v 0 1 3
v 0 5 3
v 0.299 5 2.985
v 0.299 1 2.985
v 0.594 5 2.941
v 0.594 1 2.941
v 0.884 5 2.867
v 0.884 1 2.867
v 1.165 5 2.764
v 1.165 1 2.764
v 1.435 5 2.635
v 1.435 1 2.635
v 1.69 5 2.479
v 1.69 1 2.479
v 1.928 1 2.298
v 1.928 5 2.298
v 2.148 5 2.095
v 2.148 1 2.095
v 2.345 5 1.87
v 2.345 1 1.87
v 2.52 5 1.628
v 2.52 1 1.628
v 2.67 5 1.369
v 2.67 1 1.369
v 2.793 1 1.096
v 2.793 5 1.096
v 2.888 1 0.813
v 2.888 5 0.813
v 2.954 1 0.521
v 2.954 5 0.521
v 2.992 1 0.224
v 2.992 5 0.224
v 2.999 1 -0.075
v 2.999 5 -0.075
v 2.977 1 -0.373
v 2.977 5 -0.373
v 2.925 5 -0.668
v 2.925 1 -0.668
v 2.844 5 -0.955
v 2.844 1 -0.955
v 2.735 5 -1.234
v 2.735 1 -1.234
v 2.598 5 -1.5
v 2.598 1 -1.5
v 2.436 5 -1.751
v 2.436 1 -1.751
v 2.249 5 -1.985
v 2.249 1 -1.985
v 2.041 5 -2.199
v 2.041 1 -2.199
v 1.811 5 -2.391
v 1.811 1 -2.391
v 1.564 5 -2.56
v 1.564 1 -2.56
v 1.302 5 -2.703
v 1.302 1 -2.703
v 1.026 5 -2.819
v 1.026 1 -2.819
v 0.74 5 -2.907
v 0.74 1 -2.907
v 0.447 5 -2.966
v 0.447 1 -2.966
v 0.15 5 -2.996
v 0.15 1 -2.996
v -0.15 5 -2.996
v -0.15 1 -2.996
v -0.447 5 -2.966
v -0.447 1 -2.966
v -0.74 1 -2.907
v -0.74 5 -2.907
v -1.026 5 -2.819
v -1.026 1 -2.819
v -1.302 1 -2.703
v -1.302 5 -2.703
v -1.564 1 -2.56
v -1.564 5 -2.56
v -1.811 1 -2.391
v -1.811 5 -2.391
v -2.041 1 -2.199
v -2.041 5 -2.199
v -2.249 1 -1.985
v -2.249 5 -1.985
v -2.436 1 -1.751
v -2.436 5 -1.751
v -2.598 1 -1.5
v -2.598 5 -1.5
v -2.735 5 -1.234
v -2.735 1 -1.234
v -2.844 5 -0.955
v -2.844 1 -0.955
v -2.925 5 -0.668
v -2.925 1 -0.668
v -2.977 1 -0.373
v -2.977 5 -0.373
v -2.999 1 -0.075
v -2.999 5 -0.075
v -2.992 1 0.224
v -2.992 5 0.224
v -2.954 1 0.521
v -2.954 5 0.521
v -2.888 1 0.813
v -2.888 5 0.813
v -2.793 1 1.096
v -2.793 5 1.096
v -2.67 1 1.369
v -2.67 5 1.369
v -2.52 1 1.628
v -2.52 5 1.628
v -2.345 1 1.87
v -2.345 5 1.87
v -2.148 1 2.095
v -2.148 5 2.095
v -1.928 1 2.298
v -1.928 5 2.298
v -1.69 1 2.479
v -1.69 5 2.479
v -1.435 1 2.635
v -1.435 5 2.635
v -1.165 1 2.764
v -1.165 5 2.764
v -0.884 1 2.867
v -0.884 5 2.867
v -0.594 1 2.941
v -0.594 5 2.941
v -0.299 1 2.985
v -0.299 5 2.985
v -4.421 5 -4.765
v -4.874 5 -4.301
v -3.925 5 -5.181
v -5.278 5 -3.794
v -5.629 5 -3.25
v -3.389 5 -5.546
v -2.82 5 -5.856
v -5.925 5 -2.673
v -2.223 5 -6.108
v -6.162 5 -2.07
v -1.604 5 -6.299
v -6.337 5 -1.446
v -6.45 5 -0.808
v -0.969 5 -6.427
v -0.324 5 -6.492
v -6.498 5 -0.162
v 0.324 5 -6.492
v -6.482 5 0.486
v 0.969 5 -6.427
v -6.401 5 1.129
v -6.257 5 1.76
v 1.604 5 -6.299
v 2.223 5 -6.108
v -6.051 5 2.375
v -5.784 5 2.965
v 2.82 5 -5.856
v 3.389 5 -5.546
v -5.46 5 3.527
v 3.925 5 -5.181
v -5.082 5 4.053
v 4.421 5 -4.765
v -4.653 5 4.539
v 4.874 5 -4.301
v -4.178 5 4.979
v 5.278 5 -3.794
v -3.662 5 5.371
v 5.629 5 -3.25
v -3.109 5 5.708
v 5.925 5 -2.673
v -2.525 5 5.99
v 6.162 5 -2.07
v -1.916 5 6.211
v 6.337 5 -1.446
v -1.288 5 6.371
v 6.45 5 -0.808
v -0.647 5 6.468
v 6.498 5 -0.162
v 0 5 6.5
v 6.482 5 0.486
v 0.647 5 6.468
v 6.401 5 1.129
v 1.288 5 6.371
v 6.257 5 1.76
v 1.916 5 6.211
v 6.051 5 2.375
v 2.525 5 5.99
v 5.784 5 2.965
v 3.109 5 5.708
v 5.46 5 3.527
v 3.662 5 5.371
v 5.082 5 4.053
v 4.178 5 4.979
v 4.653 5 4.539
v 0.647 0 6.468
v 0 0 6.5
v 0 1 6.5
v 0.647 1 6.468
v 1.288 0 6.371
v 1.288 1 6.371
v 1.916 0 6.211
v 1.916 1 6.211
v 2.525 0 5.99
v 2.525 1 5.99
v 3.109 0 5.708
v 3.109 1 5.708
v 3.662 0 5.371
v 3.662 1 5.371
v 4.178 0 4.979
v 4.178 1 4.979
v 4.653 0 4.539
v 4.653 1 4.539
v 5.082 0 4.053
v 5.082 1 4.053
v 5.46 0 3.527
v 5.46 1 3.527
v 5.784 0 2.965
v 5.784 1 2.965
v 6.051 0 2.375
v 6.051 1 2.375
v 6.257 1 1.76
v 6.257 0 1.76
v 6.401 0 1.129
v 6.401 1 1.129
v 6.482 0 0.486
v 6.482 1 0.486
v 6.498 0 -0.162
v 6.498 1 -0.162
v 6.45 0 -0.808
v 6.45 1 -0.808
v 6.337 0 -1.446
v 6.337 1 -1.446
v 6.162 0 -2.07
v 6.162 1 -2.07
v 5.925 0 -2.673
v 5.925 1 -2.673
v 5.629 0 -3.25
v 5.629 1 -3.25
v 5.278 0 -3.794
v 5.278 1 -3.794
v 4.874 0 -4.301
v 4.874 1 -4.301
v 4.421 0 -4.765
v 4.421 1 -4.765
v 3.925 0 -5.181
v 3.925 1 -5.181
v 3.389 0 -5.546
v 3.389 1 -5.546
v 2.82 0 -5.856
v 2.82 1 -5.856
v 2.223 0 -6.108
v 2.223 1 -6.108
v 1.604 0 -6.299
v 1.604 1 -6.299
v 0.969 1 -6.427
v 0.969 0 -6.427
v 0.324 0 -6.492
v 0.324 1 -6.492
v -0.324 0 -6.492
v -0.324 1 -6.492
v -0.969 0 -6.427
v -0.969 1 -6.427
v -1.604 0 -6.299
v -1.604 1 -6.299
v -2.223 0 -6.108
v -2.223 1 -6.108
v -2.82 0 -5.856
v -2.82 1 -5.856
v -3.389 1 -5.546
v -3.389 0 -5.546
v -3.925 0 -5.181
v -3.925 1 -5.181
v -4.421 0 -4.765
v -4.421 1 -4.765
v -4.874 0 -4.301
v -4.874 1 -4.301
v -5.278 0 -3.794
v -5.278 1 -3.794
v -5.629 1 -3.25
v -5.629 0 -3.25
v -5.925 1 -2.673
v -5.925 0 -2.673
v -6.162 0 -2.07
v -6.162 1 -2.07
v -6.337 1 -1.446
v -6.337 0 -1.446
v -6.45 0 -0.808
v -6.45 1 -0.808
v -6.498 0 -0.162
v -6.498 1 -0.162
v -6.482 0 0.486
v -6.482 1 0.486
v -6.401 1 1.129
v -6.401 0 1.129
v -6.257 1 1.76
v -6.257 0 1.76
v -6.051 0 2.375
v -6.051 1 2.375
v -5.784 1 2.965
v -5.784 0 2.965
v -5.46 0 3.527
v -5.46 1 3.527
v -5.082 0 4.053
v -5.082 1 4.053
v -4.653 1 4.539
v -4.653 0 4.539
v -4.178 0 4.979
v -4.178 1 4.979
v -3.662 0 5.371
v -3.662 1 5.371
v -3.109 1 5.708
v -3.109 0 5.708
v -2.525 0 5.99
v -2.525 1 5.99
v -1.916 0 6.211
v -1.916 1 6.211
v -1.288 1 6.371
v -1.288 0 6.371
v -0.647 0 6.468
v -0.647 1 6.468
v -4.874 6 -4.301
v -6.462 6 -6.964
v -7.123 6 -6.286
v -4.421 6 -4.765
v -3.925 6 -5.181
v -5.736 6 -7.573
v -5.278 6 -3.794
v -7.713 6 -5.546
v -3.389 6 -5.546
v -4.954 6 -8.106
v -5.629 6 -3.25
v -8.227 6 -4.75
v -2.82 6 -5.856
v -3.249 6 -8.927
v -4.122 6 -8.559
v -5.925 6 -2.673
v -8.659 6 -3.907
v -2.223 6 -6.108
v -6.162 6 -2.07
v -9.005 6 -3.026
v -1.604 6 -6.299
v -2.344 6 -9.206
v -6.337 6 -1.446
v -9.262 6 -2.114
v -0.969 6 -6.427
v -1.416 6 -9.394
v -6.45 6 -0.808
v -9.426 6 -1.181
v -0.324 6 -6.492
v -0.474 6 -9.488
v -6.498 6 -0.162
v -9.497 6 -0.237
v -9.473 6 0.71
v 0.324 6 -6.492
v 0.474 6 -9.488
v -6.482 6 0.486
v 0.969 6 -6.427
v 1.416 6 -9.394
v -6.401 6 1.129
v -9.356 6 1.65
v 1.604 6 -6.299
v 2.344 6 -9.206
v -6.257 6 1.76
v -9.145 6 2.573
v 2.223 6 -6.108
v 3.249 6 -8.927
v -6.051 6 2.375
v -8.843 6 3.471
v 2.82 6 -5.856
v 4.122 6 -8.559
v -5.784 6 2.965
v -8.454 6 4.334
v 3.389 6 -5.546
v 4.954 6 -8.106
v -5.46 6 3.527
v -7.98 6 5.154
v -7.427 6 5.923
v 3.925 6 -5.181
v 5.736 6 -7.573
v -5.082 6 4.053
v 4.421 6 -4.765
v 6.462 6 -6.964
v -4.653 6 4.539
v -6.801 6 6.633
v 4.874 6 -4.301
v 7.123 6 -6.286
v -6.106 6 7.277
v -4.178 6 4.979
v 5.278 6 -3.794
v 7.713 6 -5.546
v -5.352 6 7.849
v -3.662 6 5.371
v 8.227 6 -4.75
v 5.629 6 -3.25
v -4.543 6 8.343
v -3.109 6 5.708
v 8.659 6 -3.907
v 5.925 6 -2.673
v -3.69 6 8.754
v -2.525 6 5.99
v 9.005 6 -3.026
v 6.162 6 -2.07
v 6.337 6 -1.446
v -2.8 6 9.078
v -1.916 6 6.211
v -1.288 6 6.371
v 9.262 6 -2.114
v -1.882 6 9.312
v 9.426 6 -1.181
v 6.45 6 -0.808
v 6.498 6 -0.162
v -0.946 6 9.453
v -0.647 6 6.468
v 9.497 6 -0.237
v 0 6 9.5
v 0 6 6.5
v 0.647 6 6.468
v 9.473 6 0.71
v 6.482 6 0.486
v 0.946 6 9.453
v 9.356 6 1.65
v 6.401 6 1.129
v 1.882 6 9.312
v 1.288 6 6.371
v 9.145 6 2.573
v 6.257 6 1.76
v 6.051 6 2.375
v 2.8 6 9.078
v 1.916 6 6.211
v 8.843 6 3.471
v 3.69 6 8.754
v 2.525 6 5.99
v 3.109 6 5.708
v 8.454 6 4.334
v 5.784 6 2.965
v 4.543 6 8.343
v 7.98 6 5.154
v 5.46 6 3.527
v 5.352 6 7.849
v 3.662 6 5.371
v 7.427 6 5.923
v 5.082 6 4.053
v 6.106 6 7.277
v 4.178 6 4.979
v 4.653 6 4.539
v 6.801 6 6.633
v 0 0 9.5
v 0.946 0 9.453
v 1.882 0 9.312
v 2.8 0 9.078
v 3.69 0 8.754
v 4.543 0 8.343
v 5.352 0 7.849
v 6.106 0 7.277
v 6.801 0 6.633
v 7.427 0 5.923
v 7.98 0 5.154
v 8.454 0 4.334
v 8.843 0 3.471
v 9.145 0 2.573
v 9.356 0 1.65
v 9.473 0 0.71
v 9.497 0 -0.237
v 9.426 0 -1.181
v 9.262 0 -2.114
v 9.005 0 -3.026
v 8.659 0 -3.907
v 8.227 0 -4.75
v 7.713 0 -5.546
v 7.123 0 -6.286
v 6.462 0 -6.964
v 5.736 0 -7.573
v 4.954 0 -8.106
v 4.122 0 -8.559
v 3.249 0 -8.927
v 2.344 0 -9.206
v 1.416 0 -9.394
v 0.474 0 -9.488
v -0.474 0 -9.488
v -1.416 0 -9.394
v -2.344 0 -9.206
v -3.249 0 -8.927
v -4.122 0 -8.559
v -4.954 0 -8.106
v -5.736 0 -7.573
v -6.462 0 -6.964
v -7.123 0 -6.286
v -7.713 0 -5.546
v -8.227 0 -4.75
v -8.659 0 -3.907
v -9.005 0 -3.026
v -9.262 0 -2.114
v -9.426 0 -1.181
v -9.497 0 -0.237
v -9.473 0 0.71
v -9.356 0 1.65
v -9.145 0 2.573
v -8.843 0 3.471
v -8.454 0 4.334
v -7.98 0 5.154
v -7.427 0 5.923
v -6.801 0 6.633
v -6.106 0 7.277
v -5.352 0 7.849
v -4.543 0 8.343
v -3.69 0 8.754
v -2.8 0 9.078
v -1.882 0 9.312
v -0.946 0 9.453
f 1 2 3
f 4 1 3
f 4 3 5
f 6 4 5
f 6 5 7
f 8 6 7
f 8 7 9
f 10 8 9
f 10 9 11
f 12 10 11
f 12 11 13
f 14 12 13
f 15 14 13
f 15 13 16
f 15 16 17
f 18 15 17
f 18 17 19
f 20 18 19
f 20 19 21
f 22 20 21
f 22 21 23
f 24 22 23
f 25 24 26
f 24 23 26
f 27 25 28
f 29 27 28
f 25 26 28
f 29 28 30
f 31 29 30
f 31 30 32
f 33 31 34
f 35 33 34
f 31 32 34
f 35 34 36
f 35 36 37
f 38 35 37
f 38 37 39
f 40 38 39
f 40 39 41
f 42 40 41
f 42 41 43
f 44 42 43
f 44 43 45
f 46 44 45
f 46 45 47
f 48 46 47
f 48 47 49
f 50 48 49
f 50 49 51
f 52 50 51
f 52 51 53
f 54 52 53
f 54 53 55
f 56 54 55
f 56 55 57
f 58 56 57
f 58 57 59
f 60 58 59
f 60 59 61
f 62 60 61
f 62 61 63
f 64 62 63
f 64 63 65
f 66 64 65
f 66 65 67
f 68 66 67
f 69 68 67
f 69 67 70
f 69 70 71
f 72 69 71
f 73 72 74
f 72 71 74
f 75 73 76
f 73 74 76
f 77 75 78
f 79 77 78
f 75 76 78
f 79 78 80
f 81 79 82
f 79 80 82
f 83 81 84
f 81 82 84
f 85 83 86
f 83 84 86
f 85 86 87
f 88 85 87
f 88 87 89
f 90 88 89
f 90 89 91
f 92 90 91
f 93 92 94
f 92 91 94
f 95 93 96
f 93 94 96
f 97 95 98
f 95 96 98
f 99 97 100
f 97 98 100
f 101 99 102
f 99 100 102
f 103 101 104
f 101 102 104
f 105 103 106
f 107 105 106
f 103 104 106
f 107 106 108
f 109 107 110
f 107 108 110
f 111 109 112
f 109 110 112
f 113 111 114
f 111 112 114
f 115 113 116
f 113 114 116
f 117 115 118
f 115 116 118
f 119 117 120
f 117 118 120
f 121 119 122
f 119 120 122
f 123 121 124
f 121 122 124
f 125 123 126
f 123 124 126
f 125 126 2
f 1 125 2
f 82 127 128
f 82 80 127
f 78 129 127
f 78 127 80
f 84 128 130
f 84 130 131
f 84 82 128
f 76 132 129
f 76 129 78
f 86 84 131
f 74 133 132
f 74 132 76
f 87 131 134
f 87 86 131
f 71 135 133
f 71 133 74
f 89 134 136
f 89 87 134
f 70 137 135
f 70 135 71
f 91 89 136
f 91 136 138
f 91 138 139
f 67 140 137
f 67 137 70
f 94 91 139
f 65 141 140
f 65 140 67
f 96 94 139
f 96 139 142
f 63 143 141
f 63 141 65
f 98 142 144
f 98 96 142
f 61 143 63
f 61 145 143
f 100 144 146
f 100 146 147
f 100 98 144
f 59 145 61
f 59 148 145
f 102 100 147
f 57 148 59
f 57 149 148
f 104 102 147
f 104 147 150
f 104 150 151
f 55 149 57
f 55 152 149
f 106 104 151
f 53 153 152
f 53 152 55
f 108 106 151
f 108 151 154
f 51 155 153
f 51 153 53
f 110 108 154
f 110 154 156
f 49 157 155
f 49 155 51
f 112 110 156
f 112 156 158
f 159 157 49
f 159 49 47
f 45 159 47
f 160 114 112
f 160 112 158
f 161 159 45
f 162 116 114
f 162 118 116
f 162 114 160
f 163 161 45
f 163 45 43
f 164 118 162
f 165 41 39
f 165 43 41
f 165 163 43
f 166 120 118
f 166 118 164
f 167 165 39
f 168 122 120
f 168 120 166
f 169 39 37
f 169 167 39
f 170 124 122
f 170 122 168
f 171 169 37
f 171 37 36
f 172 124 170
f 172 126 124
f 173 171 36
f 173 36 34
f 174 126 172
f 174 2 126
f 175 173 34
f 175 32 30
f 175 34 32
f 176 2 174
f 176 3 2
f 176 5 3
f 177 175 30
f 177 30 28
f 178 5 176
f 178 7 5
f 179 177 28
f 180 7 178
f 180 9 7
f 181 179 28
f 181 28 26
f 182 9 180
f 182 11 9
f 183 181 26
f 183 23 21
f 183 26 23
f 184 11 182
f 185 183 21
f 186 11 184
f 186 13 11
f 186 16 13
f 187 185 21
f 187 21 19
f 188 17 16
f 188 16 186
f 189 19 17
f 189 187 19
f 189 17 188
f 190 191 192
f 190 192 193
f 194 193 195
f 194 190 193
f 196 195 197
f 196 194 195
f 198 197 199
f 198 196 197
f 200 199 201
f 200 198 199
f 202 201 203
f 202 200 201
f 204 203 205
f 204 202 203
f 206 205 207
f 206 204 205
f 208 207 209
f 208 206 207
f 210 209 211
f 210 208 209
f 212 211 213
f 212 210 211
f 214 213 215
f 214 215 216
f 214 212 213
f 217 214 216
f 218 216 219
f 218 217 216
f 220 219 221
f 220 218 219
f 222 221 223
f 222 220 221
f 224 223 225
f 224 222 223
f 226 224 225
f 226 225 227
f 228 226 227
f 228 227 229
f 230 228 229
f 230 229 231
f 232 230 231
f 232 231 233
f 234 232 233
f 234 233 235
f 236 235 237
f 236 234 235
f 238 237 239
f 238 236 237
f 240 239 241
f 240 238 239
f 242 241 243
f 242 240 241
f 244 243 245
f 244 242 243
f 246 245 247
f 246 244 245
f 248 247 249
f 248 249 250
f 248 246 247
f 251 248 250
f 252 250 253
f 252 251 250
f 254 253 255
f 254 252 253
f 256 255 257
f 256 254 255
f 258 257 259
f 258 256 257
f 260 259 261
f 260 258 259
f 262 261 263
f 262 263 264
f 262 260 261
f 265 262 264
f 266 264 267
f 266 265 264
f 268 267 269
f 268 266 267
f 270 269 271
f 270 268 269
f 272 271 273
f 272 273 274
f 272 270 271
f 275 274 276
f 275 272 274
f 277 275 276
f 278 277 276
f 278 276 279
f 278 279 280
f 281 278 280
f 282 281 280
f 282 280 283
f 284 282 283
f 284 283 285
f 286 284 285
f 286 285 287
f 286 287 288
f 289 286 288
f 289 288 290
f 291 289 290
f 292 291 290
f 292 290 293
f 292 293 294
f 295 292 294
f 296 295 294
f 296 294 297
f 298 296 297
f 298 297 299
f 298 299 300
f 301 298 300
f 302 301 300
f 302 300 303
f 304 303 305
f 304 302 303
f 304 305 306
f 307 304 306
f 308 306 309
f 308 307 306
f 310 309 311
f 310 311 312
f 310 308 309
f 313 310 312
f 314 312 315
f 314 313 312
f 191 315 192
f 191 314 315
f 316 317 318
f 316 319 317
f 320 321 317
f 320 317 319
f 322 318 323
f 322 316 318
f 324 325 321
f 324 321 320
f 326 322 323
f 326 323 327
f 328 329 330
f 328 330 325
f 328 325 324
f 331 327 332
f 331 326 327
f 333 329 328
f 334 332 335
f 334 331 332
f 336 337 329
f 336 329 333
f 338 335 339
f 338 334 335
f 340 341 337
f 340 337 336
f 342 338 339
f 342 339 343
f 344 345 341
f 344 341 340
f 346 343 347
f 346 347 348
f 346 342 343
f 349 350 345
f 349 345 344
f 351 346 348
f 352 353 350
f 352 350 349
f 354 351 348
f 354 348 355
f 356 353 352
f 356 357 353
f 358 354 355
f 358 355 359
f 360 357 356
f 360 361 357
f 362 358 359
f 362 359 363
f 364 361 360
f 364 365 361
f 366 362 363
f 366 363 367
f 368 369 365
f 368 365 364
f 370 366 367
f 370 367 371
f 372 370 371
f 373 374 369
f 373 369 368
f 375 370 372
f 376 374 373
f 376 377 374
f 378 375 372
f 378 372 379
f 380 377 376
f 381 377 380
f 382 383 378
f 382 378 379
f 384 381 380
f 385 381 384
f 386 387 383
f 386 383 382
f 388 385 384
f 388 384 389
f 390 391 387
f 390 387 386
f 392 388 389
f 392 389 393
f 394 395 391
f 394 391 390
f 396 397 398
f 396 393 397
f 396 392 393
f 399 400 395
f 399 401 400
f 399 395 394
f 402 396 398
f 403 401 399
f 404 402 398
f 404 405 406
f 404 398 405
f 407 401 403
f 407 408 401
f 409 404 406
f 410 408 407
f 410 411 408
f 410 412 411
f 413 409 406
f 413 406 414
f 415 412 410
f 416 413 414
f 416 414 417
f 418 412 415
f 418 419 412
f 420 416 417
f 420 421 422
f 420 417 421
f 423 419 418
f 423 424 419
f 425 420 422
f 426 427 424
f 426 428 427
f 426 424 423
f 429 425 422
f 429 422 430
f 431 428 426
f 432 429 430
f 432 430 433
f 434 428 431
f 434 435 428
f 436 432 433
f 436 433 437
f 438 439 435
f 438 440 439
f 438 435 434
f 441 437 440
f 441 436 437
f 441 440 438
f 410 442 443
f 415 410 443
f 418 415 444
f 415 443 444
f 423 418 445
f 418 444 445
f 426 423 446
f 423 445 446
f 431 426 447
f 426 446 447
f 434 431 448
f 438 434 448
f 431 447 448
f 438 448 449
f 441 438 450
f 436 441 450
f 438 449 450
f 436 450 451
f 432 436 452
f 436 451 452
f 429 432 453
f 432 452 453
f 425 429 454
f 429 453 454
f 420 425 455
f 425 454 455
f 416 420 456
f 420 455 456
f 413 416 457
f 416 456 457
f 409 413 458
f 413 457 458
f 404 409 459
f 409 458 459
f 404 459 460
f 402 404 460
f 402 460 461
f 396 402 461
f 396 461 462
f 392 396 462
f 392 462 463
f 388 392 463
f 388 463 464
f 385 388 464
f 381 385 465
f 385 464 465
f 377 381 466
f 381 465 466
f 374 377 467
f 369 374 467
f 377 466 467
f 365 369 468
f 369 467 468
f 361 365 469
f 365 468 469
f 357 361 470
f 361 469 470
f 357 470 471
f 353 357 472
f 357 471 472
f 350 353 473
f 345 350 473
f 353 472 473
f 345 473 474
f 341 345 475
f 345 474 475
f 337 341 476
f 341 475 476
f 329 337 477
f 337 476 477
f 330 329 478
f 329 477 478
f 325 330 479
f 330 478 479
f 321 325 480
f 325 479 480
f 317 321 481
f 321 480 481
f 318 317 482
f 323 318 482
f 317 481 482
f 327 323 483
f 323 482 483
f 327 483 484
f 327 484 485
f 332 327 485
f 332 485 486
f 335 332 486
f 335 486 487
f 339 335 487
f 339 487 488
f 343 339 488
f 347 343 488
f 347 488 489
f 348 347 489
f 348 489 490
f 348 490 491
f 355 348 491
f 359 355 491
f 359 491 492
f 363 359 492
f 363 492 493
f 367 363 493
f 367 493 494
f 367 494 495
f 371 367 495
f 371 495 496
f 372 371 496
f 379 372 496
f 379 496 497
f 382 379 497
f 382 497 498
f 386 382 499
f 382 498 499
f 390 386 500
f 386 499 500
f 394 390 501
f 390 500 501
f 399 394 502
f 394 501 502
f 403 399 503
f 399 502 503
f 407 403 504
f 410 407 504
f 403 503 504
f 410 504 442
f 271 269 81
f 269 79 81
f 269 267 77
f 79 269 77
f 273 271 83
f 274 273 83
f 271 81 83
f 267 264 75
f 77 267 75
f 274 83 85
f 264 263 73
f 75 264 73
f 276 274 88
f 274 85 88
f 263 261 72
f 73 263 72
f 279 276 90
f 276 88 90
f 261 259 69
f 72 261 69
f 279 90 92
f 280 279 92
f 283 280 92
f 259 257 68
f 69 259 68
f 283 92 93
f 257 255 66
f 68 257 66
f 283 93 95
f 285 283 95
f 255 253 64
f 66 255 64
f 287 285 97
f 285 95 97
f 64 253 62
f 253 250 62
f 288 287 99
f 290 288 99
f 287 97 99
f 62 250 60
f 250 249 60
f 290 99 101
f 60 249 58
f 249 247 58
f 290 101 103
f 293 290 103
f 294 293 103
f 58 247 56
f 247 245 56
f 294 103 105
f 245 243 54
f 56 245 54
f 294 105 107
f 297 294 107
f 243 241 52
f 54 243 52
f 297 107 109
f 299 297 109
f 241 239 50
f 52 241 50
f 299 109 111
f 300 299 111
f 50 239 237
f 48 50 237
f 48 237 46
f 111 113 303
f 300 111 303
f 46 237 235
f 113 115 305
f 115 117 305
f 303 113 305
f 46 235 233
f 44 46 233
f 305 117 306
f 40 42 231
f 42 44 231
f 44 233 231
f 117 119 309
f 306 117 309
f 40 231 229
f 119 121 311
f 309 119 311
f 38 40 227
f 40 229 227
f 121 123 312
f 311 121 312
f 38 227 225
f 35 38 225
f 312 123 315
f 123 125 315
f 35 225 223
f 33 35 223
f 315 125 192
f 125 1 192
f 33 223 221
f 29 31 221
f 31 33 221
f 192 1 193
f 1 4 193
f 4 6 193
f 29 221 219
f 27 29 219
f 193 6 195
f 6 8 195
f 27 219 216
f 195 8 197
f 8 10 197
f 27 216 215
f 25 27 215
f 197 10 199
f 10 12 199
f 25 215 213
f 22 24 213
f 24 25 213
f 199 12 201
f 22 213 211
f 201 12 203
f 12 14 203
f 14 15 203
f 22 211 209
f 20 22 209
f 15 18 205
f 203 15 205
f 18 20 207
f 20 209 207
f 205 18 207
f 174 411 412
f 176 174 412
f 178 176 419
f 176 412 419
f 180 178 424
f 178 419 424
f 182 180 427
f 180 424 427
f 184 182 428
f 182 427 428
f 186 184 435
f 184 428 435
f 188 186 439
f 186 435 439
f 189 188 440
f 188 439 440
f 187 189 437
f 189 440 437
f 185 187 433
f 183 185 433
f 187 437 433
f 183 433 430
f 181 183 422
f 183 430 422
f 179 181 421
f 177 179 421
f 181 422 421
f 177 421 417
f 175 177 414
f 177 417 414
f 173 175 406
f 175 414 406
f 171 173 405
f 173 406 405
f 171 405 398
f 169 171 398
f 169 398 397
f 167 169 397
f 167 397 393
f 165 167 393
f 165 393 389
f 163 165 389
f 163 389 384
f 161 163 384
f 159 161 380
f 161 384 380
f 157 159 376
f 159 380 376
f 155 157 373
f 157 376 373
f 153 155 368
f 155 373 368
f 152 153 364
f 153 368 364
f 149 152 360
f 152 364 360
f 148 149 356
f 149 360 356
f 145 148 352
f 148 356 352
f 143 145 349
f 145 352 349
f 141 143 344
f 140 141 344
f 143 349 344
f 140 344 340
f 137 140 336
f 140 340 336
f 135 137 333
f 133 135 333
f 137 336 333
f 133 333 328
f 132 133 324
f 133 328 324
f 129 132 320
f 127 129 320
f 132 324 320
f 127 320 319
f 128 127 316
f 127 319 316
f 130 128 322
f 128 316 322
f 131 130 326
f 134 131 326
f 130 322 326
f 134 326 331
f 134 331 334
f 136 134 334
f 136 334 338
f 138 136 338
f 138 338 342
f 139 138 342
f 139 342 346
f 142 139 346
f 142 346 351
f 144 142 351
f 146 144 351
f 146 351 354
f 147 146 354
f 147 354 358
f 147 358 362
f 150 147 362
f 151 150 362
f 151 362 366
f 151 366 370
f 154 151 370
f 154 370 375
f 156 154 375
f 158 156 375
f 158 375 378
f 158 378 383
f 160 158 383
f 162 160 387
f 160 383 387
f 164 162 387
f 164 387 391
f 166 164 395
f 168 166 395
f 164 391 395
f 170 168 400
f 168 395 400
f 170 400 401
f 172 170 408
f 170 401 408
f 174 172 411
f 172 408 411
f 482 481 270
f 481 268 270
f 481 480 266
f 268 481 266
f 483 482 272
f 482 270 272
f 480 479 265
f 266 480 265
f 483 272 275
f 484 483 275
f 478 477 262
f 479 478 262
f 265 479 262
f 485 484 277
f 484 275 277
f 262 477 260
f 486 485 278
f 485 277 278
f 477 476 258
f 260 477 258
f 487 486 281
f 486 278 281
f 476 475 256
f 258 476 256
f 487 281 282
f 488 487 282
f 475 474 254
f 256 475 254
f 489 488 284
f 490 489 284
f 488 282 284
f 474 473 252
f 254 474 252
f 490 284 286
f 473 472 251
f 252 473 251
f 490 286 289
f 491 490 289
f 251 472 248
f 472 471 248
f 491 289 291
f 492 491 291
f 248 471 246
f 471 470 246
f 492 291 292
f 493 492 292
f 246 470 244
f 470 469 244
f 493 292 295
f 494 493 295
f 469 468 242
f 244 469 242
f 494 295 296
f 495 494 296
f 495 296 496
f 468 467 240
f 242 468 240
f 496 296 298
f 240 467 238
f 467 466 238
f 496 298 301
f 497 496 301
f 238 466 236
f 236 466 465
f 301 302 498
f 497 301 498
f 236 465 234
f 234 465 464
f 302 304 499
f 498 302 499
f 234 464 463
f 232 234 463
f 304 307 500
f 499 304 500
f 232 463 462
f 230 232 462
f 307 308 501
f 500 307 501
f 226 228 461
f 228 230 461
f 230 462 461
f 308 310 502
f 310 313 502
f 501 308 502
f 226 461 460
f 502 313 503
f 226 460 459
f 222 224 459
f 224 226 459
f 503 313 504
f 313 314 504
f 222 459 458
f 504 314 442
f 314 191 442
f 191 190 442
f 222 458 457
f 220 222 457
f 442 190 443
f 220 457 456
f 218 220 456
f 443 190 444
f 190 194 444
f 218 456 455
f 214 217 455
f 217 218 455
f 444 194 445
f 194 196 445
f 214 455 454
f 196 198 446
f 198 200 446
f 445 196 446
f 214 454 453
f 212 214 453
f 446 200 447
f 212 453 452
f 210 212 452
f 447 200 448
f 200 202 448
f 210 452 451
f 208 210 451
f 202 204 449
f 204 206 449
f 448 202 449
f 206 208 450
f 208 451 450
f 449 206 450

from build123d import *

# Parameters (mm, degrees)
SKETCH1_R           = 9.5
BOSS_EXTRUDE1_DEPTH = 6
SKETCH2_R           = 6.5
CUT_EXTRUDE1_DEPTH  = 1
SKETCH3_R           = 3
CUT_EXTRUDE2_DEPTH  = 15.335271187


with BuildPart() as part:
    # Sketch1 → Boss-Extrude1 (new body)
    with BuildSketch(Plane(origin=(0, 0, 0), x_dir=(1, 0, 0), z_dir=(0, 1, 0))):
        with Locations(Location((0, 0, 0), (0, 0, 270))):
            Circle(SKETCH1_R)
    extrude(amount=BOSS_EXTRUDE1_DEPTH)

    # Sketch2 → Cut-Extrude1 (cut)
    with BuildSketch(Plane(origin=(0, 6, 0), x_dir=(1, 0, 0), z_dir=(0, 1, 0))):
        with Locations(Location((0, 0, 0), (0, 0, 270))):
            Circle(SKETCH2_R)
    cut_extrude1 = extrude(amount=-CUT_EXTRUDE1_DEPTH, mode=Mode.SUBTRACT)

    # Sketch3 → Cut-Extrude2 (cut, through all)
    with BuildSketch(Plane(origin=(0, 5, 0), x_dir=(1, 0, 0), z_dir=(0, 1, 0))):
        with Locations(Location((0, 0, 0), (0, 0, 270))):
            Circle(SKETCH3_R)
    extrude(amount=-CUT_EXTRUDE2_DEPTH, mode=Mode.SUBTRACT)

    # Mirror1: Cut-Extrude1 across plane
    add(cut_extrude1.mirror(Plane.ZX.offset(3)), mode=Mode.SUBTRACT)


solid = part.part
